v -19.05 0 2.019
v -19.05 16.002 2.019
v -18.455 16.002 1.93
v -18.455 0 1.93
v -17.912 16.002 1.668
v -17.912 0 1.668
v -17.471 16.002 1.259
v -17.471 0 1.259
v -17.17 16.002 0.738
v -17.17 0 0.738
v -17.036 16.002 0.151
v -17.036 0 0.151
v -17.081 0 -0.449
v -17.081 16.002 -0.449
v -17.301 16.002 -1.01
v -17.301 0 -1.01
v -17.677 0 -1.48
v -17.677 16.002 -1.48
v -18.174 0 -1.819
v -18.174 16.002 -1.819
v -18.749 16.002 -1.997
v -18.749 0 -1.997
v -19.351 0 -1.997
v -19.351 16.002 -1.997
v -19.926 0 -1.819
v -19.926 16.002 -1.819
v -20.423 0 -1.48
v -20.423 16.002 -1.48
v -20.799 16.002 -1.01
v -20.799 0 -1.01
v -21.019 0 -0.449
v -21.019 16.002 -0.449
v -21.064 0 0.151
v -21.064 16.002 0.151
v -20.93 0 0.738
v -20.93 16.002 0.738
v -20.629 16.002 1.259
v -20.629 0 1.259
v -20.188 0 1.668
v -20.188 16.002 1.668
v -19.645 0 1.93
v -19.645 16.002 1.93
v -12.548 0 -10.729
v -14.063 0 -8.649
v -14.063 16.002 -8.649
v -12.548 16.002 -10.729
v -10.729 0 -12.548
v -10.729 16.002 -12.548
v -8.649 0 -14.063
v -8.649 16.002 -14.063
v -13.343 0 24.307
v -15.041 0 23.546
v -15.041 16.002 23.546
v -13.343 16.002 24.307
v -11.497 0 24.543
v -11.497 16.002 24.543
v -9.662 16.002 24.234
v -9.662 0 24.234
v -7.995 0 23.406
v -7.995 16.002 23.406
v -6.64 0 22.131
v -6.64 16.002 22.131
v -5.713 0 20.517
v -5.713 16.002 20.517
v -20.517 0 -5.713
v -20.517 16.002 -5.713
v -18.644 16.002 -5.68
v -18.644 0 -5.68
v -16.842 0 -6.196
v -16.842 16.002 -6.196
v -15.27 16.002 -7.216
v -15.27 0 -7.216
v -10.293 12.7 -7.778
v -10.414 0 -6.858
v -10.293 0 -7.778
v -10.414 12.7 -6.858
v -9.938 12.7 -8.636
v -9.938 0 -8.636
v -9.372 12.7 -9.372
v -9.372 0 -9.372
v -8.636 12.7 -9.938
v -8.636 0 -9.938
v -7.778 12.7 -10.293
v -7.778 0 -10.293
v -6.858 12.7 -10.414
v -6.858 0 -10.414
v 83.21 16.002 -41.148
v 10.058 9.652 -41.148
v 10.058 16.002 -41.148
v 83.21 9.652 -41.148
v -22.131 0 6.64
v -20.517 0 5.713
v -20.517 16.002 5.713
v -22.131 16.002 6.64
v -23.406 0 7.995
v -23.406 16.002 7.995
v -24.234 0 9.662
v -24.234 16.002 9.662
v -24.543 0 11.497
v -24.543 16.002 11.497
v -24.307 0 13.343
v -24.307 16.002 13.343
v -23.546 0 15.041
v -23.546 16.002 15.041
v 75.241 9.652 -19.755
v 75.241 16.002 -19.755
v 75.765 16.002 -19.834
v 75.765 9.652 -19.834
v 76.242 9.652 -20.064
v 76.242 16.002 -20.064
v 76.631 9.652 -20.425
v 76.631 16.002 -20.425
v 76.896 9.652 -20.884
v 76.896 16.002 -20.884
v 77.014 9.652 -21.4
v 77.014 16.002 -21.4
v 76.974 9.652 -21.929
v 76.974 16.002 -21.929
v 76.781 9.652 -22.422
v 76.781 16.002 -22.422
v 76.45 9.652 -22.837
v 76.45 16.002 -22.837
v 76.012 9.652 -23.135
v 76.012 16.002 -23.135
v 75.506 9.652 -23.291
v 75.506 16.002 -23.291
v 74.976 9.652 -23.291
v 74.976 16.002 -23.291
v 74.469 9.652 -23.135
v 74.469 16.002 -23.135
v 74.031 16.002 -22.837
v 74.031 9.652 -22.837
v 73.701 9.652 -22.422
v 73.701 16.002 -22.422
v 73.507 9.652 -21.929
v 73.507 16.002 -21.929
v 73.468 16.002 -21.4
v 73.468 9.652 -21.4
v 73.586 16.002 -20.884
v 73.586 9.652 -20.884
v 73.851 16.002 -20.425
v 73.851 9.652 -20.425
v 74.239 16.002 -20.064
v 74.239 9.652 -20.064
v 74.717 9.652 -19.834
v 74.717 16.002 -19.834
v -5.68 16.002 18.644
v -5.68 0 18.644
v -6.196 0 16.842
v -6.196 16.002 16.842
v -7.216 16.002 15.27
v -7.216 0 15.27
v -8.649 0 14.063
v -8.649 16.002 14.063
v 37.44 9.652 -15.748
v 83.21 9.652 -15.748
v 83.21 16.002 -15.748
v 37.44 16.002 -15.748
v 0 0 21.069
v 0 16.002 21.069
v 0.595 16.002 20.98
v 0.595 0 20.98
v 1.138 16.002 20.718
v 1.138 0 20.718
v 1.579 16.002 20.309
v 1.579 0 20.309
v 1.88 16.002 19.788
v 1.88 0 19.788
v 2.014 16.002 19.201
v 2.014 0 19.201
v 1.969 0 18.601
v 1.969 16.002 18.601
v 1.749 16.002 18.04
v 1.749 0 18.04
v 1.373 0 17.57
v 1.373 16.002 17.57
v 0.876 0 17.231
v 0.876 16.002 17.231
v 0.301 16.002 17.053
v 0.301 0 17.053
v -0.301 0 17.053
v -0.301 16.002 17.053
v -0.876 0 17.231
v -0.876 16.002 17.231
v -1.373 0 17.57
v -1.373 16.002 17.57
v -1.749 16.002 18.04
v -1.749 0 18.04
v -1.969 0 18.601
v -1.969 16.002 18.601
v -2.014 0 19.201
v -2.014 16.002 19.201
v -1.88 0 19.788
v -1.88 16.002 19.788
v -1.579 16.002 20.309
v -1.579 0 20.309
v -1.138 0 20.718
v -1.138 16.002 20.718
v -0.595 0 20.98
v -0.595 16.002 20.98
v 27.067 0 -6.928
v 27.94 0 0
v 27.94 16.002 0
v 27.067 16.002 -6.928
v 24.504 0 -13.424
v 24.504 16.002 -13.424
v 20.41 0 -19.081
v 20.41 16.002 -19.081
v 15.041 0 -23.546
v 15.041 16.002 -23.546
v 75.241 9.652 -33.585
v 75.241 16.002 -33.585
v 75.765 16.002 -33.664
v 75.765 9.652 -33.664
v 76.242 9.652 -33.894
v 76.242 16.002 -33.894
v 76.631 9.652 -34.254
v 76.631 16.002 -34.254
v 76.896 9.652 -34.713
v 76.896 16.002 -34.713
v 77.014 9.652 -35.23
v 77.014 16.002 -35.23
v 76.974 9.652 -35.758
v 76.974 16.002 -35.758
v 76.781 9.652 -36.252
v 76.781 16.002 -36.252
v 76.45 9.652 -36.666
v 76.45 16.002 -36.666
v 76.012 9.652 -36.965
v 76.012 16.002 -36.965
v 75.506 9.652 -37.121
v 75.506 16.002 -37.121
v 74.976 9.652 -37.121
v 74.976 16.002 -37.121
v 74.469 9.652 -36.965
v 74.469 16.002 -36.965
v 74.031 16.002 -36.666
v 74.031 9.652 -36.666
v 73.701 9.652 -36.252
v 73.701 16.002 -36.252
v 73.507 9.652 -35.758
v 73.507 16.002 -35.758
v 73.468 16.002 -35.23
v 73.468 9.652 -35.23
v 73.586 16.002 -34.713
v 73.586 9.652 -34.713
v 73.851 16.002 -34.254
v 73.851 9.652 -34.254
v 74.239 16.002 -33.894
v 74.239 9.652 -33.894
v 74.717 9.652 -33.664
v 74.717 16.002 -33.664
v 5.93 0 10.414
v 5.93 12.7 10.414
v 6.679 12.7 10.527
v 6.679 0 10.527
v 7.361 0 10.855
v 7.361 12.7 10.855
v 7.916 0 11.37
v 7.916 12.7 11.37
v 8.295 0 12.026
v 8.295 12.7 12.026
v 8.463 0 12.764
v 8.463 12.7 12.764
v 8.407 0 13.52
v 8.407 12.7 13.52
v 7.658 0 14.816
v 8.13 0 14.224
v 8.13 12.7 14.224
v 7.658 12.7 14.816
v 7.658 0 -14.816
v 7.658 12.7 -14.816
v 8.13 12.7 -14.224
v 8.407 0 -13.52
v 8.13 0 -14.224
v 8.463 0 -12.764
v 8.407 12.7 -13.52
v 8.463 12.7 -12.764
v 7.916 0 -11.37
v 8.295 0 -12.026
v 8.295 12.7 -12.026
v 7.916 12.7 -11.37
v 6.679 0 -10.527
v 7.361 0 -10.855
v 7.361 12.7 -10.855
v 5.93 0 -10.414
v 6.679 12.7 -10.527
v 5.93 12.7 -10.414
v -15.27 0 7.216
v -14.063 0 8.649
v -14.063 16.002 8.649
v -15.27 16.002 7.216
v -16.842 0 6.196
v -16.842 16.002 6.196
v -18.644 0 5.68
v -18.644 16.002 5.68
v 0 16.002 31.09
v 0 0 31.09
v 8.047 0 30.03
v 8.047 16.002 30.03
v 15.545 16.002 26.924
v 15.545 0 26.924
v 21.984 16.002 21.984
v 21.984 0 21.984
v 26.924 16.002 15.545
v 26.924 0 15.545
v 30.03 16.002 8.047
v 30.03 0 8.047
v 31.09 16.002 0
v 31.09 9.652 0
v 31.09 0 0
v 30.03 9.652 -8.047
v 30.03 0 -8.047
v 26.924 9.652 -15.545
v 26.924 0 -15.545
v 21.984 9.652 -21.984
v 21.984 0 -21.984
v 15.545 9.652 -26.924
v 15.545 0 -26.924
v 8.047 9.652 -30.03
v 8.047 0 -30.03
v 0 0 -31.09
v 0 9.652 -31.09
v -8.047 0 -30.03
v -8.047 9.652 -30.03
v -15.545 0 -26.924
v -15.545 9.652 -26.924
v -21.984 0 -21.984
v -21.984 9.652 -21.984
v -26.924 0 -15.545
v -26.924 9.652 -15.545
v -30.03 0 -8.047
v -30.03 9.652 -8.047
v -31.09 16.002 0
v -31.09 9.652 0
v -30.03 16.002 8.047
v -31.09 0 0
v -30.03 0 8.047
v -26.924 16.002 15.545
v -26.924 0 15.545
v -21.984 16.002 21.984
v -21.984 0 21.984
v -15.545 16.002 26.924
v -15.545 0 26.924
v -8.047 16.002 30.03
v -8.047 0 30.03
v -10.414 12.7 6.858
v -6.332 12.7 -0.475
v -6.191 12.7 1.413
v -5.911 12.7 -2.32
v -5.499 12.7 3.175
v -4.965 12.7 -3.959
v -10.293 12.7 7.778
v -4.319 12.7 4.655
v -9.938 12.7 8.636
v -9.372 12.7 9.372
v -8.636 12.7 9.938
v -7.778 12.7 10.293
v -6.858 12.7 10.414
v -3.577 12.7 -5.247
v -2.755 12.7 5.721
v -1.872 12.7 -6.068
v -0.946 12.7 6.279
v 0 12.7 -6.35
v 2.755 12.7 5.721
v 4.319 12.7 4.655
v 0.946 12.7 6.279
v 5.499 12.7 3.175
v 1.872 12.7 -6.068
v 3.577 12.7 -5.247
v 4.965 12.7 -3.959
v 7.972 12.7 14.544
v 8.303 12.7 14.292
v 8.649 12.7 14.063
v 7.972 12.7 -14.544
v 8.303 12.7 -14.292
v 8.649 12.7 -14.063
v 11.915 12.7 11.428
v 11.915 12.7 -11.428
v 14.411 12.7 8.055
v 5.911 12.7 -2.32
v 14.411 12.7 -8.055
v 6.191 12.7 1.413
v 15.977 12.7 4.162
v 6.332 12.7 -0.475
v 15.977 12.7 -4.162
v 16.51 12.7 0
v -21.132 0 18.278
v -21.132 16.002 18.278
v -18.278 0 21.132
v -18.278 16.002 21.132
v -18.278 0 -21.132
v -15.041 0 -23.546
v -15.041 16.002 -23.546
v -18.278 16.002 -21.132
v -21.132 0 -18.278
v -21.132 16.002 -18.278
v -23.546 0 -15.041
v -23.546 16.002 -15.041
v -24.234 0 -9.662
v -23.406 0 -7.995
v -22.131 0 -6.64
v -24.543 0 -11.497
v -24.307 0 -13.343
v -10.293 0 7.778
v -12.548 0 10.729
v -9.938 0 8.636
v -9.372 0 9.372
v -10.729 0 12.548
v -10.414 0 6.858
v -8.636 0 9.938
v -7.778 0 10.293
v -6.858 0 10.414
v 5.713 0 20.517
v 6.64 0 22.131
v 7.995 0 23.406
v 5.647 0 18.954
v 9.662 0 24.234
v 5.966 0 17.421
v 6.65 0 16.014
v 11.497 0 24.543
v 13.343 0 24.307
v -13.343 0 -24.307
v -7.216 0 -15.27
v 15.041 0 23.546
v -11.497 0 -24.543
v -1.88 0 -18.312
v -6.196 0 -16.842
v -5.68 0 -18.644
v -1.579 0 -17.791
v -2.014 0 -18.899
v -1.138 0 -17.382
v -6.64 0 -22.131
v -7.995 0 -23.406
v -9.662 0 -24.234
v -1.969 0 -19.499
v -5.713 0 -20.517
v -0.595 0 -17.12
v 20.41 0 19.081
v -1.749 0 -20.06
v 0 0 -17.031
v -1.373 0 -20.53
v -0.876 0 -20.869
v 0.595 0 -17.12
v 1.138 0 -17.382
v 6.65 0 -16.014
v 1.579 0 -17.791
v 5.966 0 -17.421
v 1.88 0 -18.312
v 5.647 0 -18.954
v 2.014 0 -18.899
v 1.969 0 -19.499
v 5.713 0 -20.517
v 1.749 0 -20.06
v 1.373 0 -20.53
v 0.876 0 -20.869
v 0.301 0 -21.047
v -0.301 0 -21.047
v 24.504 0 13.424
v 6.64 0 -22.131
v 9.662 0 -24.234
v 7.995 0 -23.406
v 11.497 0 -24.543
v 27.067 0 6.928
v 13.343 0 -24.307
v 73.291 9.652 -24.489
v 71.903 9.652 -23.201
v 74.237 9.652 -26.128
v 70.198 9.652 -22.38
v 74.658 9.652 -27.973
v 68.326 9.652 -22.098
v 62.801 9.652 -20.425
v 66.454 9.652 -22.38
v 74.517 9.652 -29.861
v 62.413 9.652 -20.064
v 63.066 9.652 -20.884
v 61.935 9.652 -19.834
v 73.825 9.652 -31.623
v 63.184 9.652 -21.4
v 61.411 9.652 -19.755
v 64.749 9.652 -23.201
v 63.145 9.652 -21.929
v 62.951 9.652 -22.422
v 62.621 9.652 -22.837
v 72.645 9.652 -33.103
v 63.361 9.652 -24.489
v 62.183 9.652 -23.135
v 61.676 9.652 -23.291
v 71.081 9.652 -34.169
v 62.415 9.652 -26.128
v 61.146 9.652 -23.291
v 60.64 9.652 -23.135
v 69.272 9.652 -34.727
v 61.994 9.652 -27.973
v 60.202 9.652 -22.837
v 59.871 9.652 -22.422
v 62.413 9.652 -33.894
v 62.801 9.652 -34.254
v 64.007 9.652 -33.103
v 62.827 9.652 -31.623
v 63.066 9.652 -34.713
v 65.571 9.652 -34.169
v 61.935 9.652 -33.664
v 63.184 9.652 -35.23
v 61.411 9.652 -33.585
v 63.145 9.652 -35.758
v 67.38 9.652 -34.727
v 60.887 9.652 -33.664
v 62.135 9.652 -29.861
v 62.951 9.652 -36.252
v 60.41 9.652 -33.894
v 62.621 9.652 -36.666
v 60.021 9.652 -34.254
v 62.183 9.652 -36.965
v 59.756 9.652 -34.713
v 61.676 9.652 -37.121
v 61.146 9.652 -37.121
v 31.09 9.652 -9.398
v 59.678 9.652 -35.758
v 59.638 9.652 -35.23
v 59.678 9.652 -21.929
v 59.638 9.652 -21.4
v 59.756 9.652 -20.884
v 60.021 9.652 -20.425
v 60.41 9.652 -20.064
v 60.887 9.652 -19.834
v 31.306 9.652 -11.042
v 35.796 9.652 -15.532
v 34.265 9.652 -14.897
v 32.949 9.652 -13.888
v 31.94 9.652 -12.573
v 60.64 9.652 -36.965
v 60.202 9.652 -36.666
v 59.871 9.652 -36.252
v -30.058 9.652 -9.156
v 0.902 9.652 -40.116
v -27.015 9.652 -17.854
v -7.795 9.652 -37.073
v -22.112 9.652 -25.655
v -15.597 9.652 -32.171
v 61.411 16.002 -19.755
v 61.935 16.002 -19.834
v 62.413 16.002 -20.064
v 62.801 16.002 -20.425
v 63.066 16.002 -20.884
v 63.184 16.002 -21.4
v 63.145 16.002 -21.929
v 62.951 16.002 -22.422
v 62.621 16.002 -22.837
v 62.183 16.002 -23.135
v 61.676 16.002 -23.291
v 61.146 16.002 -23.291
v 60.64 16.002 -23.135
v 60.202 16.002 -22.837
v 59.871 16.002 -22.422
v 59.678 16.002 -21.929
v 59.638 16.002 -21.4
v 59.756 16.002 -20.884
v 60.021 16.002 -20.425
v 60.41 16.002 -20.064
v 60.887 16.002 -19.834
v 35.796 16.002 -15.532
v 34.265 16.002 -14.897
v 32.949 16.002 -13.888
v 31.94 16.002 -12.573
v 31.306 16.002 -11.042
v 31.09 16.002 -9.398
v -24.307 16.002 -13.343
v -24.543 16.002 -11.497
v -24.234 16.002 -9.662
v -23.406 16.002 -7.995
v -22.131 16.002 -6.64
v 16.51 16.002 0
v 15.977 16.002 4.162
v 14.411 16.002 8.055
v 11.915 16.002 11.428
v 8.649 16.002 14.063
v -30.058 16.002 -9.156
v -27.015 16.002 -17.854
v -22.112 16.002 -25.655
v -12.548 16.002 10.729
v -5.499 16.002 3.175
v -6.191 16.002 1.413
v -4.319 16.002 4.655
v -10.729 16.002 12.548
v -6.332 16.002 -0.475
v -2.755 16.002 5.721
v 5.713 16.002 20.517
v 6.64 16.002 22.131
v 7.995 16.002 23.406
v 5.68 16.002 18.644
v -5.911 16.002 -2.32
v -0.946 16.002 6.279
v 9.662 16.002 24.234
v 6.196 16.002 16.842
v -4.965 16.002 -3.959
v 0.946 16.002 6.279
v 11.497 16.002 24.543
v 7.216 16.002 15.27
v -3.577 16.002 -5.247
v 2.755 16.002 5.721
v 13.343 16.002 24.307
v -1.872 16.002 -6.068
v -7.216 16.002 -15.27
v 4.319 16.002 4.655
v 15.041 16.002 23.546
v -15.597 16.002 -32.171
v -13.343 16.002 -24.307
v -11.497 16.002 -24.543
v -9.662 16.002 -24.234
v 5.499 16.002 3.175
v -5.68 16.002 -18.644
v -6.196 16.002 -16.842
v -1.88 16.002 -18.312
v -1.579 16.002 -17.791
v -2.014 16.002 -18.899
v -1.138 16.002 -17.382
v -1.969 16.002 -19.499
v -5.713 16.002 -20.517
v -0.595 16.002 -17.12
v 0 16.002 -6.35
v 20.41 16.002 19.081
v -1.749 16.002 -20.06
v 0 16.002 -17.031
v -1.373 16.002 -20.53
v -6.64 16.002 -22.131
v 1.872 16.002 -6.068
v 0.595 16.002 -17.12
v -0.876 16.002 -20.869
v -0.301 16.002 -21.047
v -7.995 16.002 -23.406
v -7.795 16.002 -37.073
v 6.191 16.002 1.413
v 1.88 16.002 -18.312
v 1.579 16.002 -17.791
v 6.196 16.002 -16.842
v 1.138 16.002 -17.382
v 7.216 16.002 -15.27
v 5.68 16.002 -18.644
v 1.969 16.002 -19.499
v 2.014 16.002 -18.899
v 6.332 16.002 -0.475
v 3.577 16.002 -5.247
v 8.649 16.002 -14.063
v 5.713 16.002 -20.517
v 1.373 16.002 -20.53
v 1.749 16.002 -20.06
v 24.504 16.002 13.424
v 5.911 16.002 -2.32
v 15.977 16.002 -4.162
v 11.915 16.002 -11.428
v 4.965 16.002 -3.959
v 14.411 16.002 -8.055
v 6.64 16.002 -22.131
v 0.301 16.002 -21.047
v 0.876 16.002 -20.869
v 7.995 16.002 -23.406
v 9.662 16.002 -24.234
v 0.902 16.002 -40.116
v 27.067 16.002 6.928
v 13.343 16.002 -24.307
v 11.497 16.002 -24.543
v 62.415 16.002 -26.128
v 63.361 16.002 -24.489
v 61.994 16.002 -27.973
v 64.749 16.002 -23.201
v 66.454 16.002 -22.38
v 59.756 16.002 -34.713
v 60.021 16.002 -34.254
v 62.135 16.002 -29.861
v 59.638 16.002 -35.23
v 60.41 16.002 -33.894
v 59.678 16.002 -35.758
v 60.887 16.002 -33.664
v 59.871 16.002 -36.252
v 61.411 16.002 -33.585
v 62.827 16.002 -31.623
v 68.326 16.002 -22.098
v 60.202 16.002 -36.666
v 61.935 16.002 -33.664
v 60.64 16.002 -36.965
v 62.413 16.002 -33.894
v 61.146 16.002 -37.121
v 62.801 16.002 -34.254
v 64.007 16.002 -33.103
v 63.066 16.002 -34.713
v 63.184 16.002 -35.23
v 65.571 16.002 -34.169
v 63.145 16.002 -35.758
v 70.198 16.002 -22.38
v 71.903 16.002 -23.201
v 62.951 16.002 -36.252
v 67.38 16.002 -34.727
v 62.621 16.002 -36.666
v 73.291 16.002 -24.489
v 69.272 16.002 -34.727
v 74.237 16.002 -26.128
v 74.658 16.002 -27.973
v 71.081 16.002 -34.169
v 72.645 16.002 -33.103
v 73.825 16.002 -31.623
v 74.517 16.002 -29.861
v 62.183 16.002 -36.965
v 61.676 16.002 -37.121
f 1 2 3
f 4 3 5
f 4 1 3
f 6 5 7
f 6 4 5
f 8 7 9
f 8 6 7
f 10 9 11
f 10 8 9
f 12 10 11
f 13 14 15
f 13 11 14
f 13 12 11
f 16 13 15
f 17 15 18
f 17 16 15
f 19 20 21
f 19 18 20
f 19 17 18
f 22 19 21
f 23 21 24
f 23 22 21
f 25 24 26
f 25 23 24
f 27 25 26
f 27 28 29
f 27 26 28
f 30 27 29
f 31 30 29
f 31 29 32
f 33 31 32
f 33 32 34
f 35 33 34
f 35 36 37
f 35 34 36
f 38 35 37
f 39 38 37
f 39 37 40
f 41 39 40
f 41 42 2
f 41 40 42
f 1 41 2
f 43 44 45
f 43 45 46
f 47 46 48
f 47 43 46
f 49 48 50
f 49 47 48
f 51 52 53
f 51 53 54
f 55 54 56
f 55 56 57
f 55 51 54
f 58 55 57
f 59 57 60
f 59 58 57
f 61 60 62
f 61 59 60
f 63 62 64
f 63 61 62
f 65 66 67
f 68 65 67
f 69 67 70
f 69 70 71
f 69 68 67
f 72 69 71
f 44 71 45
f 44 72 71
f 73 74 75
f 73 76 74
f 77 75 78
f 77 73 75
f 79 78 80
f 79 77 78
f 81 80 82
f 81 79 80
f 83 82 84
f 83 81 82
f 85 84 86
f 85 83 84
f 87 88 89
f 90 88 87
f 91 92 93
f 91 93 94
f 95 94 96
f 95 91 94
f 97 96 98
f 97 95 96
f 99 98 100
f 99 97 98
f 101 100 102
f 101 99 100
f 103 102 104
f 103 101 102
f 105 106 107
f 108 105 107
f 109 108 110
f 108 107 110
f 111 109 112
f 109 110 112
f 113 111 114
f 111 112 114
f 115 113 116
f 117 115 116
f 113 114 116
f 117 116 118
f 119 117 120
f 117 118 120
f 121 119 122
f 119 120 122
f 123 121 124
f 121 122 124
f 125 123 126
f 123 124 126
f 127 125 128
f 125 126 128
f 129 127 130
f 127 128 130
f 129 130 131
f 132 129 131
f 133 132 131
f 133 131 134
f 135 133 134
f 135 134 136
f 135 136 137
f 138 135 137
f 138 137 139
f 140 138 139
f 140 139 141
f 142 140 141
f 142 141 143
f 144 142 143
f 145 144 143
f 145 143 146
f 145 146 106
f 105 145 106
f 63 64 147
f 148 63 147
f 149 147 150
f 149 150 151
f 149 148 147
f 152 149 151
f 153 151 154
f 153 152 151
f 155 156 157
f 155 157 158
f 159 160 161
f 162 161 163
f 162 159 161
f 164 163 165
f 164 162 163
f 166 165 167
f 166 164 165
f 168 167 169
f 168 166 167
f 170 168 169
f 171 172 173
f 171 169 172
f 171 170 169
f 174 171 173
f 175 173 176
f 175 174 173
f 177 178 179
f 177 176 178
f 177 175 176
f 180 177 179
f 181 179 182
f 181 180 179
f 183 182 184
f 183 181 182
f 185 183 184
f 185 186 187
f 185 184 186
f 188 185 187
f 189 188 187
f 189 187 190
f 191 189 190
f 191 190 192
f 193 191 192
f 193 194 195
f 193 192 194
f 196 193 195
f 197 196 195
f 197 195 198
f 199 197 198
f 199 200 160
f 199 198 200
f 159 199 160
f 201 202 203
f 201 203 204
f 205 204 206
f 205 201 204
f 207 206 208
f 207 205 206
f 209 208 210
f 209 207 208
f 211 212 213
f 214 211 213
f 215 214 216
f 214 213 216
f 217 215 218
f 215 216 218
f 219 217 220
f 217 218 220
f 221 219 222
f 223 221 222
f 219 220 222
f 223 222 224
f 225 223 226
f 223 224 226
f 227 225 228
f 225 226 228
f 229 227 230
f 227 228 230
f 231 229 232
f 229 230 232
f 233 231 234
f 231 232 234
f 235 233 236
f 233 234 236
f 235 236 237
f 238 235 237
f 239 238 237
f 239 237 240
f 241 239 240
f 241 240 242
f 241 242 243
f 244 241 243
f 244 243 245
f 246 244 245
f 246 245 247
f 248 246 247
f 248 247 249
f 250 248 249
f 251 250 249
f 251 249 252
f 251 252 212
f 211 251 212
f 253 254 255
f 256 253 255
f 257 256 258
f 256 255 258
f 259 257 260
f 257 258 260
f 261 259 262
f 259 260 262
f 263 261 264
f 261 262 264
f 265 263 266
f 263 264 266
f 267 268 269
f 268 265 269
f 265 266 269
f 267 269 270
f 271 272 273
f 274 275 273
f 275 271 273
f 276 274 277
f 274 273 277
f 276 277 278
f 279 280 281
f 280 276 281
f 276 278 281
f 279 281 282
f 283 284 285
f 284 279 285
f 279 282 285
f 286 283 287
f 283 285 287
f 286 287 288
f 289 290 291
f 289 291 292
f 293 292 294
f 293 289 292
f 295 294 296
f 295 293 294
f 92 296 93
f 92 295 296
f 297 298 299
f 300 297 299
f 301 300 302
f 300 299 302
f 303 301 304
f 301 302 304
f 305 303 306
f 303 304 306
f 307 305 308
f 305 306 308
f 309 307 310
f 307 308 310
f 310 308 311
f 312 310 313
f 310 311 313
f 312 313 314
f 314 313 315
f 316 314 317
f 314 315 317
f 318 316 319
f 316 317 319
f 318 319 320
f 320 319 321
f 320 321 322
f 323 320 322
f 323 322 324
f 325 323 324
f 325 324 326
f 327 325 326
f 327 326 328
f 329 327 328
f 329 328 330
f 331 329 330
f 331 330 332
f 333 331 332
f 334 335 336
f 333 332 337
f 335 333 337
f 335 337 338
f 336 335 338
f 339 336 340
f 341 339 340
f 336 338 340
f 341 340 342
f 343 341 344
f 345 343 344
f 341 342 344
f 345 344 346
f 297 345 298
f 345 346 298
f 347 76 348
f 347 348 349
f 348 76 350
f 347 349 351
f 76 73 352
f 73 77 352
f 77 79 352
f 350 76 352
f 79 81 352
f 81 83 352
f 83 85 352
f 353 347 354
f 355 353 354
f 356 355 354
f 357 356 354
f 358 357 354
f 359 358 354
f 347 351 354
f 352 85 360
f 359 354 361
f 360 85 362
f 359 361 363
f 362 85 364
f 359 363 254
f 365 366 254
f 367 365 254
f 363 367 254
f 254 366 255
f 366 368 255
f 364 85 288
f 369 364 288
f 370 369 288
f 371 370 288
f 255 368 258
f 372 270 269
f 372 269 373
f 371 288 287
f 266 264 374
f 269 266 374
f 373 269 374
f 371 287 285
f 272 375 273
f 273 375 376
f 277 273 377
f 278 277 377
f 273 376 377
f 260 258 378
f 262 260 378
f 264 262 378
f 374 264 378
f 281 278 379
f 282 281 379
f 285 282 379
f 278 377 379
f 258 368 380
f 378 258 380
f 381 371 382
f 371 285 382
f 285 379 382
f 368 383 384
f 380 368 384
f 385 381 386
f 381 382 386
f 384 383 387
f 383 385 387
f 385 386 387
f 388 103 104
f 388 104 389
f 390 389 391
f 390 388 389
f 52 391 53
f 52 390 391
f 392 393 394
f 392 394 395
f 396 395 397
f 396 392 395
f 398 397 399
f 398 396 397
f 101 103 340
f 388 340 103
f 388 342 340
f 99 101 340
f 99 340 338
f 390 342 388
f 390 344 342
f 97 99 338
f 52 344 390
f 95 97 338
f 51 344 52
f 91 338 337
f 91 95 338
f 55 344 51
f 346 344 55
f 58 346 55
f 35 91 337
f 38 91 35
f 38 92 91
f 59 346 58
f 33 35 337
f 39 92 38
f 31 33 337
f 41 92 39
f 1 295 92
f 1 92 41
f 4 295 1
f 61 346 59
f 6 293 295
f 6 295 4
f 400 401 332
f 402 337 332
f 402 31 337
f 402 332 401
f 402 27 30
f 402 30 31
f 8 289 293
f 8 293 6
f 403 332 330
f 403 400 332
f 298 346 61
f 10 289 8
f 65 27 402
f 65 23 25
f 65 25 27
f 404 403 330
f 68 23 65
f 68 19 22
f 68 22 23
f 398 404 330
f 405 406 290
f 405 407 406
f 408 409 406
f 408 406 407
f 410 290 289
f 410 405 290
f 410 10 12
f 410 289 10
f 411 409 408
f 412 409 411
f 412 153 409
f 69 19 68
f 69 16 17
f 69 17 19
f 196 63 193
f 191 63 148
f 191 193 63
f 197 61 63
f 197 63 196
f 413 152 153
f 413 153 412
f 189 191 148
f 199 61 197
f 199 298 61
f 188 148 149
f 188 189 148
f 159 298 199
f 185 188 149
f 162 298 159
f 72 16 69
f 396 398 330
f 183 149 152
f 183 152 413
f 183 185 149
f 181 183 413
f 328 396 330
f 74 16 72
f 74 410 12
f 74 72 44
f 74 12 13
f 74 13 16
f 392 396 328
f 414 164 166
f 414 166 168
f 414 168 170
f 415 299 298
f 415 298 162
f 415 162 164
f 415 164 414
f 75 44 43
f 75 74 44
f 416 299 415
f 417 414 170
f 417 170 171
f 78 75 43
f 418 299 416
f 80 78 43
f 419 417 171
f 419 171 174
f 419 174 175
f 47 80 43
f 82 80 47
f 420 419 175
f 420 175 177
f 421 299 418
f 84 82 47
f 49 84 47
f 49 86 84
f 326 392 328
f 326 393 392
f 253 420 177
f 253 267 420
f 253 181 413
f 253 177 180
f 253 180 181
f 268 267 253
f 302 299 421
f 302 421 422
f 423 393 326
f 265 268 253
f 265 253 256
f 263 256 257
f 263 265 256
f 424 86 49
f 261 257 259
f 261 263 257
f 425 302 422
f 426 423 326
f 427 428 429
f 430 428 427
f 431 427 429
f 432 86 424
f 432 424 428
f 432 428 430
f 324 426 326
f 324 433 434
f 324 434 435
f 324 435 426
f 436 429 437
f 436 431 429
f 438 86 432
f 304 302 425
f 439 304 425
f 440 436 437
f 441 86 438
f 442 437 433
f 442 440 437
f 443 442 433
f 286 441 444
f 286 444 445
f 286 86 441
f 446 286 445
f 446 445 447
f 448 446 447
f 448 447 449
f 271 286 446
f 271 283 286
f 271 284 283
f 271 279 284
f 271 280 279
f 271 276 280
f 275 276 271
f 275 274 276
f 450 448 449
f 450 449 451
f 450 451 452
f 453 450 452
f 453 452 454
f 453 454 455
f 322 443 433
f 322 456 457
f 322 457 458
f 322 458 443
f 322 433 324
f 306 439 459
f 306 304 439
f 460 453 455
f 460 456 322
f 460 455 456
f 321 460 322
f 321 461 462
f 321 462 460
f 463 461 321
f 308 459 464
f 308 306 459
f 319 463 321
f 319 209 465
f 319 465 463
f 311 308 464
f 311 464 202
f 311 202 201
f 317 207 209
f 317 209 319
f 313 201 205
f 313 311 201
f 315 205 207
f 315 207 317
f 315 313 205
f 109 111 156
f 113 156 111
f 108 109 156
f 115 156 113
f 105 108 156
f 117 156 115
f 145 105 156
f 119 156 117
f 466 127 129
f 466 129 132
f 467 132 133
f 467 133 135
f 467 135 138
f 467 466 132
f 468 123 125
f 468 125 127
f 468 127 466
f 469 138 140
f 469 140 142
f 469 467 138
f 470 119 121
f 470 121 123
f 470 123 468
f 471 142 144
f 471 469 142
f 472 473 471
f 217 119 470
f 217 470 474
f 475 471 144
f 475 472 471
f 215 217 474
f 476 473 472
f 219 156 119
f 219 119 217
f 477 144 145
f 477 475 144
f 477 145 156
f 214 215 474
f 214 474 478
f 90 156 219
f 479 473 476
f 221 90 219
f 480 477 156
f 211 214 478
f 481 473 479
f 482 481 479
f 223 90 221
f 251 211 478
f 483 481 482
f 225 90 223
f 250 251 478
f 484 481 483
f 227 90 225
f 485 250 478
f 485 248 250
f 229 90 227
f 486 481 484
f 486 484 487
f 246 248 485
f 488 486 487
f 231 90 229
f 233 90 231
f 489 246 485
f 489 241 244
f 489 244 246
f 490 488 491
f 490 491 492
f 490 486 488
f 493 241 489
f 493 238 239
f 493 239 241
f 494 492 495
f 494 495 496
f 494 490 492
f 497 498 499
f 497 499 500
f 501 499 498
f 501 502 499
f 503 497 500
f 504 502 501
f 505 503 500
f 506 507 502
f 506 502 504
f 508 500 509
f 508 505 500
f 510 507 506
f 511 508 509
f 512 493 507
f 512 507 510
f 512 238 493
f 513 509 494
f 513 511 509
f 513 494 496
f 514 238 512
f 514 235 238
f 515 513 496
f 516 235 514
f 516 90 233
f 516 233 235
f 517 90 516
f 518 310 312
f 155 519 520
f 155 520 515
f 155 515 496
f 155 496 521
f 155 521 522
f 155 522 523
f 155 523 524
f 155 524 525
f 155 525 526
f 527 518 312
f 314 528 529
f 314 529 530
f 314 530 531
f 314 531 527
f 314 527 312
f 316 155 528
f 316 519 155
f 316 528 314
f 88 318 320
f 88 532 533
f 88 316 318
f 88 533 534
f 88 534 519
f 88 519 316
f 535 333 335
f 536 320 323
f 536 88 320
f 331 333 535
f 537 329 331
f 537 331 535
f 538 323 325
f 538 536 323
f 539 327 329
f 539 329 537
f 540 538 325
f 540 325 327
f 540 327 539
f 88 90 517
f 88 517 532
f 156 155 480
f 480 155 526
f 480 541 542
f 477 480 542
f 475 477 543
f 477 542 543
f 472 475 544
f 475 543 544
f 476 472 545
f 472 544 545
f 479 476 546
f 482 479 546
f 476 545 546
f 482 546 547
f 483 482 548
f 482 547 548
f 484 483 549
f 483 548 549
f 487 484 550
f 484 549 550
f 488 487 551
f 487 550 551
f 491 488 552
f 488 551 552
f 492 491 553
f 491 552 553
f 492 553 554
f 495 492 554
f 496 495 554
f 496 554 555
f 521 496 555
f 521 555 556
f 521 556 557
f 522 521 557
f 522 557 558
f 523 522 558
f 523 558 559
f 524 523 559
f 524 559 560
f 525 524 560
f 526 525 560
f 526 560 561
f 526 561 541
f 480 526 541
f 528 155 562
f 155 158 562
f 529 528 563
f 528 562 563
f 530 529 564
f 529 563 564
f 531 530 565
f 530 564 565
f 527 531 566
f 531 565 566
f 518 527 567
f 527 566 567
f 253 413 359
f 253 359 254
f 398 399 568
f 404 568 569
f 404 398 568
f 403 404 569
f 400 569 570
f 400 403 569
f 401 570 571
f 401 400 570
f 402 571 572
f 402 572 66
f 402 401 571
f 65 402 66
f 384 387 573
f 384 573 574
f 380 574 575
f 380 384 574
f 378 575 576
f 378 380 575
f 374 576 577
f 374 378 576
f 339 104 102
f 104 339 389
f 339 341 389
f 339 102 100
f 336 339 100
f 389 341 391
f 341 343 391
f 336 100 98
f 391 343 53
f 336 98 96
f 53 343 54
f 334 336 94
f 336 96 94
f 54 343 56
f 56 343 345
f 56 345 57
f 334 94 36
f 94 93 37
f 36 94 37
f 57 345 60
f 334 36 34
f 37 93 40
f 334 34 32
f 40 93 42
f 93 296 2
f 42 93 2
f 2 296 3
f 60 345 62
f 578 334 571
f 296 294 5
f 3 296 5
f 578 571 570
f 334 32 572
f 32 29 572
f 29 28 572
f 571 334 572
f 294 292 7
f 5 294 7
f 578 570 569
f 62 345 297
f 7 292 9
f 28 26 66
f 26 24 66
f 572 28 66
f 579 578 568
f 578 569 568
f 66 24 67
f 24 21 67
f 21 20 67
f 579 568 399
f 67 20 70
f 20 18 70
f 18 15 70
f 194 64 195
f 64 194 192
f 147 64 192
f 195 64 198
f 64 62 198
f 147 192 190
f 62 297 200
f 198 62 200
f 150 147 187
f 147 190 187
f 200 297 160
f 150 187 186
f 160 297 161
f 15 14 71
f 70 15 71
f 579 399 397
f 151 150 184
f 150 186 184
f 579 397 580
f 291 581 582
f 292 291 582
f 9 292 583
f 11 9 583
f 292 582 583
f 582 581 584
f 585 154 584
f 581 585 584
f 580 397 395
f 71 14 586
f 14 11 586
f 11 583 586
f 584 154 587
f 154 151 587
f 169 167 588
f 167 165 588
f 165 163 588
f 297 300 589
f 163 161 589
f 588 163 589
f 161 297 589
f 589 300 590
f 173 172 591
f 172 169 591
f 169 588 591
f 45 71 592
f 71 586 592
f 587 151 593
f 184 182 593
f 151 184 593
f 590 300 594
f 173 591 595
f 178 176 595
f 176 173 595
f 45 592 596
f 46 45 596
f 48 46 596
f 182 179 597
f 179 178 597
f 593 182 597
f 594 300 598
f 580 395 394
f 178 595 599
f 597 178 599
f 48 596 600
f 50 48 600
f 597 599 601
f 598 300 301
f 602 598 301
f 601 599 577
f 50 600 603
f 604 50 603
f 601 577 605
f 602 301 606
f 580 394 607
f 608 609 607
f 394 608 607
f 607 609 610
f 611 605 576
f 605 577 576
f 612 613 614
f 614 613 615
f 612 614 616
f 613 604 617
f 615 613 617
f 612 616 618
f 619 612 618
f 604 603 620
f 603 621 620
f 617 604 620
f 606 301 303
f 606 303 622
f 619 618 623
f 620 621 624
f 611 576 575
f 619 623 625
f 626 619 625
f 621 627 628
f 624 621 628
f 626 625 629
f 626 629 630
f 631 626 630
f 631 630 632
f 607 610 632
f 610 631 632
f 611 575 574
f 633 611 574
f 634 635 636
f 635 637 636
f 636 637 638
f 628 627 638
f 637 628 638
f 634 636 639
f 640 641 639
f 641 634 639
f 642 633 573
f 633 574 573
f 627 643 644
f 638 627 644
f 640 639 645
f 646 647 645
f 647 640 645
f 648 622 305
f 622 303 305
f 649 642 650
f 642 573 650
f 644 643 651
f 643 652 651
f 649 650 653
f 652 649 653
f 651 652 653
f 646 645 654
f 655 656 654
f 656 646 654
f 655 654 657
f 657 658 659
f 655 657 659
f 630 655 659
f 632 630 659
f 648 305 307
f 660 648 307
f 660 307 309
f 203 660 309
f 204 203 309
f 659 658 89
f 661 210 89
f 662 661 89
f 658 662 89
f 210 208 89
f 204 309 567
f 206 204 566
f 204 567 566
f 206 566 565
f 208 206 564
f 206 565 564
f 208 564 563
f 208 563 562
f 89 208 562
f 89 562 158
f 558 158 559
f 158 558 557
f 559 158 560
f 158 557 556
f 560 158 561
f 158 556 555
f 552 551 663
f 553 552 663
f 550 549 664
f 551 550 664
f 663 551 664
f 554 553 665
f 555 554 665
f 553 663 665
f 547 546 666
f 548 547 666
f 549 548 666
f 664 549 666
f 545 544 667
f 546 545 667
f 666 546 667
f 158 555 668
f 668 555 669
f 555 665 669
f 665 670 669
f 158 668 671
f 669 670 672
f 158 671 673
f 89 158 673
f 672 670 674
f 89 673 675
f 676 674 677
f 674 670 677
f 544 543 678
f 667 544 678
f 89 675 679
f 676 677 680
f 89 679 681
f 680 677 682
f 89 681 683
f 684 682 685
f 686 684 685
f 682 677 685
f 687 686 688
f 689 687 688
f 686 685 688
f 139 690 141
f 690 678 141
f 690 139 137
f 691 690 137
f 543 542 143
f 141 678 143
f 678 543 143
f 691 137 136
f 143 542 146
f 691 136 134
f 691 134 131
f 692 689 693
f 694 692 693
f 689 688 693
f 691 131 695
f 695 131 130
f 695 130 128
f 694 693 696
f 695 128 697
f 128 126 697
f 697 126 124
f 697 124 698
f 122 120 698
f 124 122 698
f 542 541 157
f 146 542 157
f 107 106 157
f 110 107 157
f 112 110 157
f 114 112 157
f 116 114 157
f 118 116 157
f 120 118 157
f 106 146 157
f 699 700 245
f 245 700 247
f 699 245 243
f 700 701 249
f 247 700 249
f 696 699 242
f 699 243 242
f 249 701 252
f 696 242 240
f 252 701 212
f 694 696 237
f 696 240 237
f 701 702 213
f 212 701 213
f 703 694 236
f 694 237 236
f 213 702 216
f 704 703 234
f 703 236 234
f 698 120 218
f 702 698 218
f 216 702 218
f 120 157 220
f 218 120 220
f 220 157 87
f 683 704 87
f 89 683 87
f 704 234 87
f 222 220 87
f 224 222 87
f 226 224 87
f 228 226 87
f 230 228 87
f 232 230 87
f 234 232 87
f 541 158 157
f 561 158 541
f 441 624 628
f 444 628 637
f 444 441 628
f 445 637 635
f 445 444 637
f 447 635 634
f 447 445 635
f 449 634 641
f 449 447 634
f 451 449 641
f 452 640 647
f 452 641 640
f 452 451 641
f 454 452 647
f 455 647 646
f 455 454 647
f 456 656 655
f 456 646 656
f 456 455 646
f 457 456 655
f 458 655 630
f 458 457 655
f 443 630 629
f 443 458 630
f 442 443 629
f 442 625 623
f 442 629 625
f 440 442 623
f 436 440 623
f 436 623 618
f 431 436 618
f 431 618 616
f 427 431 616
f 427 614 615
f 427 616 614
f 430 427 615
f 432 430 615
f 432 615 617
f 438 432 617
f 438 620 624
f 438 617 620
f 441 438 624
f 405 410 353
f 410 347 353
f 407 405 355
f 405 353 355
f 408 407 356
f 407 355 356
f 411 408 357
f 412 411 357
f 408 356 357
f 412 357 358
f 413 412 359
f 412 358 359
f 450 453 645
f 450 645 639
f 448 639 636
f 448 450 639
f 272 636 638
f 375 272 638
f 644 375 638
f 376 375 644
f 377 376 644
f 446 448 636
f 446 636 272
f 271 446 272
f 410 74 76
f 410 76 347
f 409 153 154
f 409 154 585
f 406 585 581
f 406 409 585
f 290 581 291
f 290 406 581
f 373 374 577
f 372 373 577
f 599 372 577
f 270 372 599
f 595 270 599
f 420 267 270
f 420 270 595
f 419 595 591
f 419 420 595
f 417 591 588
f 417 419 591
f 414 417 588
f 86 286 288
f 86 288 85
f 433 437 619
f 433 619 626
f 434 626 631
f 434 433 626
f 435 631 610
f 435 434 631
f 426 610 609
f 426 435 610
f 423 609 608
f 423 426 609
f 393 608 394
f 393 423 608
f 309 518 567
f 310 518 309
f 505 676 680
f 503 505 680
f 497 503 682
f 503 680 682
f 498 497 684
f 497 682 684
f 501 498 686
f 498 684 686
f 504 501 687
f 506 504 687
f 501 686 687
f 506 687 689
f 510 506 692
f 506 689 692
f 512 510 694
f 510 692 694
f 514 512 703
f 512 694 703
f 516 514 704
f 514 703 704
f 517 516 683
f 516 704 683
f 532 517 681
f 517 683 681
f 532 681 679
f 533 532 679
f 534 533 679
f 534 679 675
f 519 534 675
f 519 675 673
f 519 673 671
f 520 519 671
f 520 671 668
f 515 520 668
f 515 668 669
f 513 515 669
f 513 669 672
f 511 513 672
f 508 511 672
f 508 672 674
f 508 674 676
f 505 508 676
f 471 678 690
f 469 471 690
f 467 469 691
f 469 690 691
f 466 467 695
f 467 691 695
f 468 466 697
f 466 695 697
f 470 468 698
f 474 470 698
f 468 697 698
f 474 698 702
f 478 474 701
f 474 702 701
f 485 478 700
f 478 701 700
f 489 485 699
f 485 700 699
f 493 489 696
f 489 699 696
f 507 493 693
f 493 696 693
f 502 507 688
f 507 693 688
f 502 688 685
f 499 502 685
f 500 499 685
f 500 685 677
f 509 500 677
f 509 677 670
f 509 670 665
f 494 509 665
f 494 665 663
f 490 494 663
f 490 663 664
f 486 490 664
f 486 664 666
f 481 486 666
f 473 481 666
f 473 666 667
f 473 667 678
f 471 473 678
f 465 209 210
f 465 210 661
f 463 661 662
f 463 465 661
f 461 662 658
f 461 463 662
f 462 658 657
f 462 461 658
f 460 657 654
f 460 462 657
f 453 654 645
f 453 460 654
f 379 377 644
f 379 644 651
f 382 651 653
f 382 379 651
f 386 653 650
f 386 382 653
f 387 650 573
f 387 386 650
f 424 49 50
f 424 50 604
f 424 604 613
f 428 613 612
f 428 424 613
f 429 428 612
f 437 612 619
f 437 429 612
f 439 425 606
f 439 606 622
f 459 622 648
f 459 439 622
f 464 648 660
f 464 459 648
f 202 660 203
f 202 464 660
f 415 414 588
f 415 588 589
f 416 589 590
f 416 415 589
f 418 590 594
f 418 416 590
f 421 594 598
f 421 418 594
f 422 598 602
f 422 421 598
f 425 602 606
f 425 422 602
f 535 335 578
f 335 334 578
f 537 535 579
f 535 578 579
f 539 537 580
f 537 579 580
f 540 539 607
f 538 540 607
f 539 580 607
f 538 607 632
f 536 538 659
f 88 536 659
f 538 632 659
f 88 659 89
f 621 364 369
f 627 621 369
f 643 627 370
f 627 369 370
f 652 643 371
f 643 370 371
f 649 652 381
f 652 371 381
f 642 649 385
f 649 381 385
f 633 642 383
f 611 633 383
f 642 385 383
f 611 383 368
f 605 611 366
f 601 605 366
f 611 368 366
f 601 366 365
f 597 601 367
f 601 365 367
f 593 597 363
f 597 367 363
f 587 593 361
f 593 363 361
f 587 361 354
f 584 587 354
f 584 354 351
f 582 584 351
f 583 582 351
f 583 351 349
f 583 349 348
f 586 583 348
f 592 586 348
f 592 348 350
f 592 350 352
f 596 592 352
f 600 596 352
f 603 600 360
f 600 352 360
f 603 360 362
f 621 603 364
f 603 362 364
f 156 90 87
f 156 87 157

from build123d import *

# Parameters (mm, degrees)
SKETCH1_R           = 31.0896
BOSS_EXTRUDE1_DEPTH = 16.002
BOSS_EXTRUDE2_START = -6.35
BOSS_EXTRUDE2_DEPTH = 6.35
FILLET2_R           = 6.35
CUT_EXTRUDE2_REACH  = 96.198
SKETCH4_R           = 1.778
SKETCH4_R_2         = 6.35
SKETCH7_R           = 2.0193
CUT_EXTRUDE4_DEPTH  = 95.197625109
FILLET7_R           = 6.35
FILLET8_R           = 41.148
CUT_EXTRUDE5_DEPTH  = 12.7
FILLET9_R           = 2.54
SKETCH9_R           = 6.35
CUT_EXTRUDE6_DEPTH  = 3.302
FILLET10_R          = 3.556


# Some blends are built 0.0001 mm under size
with BuildPart() as part:
    # Sketch1 → Boss-Extrude1 (new body)
    with BuildSketch(Plane(origin=(0, 0, 0), x_dir=(1, 0, 0), z_dir=(0, 1, 0))):
        with Locations(Location((0, 0, 0), (0, 0, 270))):
            Circle(SKETCH1_R)
    extrude(amount=BOSS_EXTRUDE1_DEPTH)

    # Sketch2 → Boss-Extrude2 (add)
    with BuildSketch(Plane(origin=(0, 16.002, 0), x_dir=(1, 0, 0), z_dir=(0, 1, 0)).offset(BOSS_EXTRUDE2_START)):
        with BuildLine():
            Line((-31.0896, 0), (-31.0896, 41.148))
            Line((-31.0896, 41.148), (83.2104, 41.148))
            Line((83.2104, 41.148), (83.2104, 15.748))
            Line((83.2104, 15.748), (31.0896, 15.748))
            Line((31.0896, 15.748), (31.0896, 0))
            ThreePointArc((31.0896, 0), (0, -31.0896), (-31.0896, 0))
        make_face()
    extrude(amount=BOSS_EXTRUDE2_DEPTH)

    # Fillet2
    fillet2_edges = [part.edges().sort_by_distance(p)[0] for p in [
        (31.0896, 12.827, -15.748),
    ]]
    fillet(fillet2_edges, radius=FILLET2_R)

    # Sketch4 → Cut-Extrude2 (cut, up to next)
    with BuildSketch(Plane(origin=(0, 16.002, 0), x_dir=(1, 0, 0), z_dir=(0, 1, 0)), mode=Mode.PRIVATE) as cut_extrude2_sk1:
        with Locations(Location((61.411202787, 35.362797213, 0), (0, 0, 270))):
            Circle(SKETCH4_R)
    cut_extrude2_tool1 = extrude(cut_extrude2_sk1.sketch, amount=-CUT_EXTRUDE2_REACH, mode=Mode.PRIVATE) & part.part
    # Sketch4 → Cut-Extrude2 (cut, up to next)
    with BuildSketch(Plane(origin=(0, 16.002, 0), x_dir=(1, 0, 0), z_dir=(0, 1, 0)), mode=Mode.PRIVATE) as cut_extrude2_sk2:
        with Locations(Location((75.240797213, 35.362797213, 0), (0, 0, 270))):
            Circle(SKETCH4_R)
    cut_extrude2_tool2 = extrude(cut_extrude2_sk2.sketch, amount=-CUT_EXTRUDE2_REACH, mode=Mode.PRIVATE) & part.part
    # Sketch4 → Cut-Extrude2 (cut, up to next)
    with BuildSketch(Plane(origin=(0, 16.002, 0), x_dir=(1, 0, 0), z_dir=(0, 1, 0)), mode=Mode.PRIVATE) as cut_extrude2_sk3:
        with Locations(Location((75.240797213, 21.533202787, 0), (0, 0, 270))):
            Circle(SKETCH4_R)
    cut_extrude2_tool3 = extrude(cut_extrude2_sk3.sketch, amount=-CUT_EXTRUDE2_REACH, mode=Mode.PRIVATE) & part.part
    # Sketch4 → Cut-Extrude2 (cut, up to next)
    with BuildSketch(Plane(origin=(0, 16.002, 0), x_dir=(1, 0, 0), z_dir=(0, 1, 0)), mode=Mode.PRIVATE) as cut_extrude2_sk4:
        with Locations(Location((68.326, 28.448, 0), (0, 0, 270))):
            Circle(SKETCH4_R_2)
    cut_extrude2_tool4 = extrude(cut_extrude2_sk4.sketch, amount=-CUT_EXTRUDE2_REACH, mode=Mode.PRIVATE) & part.part
    # Sketch4 → Cut-Extrude2 (cut, up to next)
    with BuildSketch(Plane(origin=(0, 16.002, 0), x_dir=(1, 0, 0), z_dir=(0, 1, 0)), mode=Mode.PRIVATE) as cut_extrude2_sk5:
        with Locations(Location((61.411202787, 21.533202787, 0), (0, 0, 270))):
            Circle(SKETCH4_R)
    cut_extrude2_tool5 = extrude(cut_extrude2_sk5.sketch, amount=-CUT_EXTRUDE2_REACH, mode=Mode.PRIVATE) & part.part
    add(cut_extrude2_tool1.solids().sort_by_distance((61.411203, 16.002, -35.362797))[0], mode=Mode.SUBTRACT)
    add(cut_extrude2_tool2.solids().sort_by_distance((75.240797, 16.002, -35.362797))[0], mode=Mode.SUBTRACT)
    add(cut_extrude2_tool3.solids().sort_by_distance((75.240797, 16.002, -21.533203))[0], mode=Mode.SUBTRACT)
    add(cut_extrude2_tool4.solids().sort_by_distance((68.326, 16.002, -28.448))[0], mode=Mode.SUBTRACT)
    add(cut_extrude2_tool5.solids().sort_by_distance((61.411203, 16.002, -21.533203))[0], mode=Mode.SUBTRACT)

    # Sketch7 → Cut-Extrude4 (cut, through all)
    with BuildSketch(Plane(origin=(0, 0, 0), x_dir=(1, 0, 0), z_dir=(0, 1, 0))):
        with BuildLine():
            ThreePointArc((27.94, 0), (22.235278576, 16.918510179), (7.450666667, 26.928259621))
            Line((7.450666667, 26.928259621), (4.402666667, 15.912153412))
            ThreePointArc((4.402666667, 15.912153412), (13.139028249, 9.997301469), (16.51, 0))
            ThreePointArc((16.51, 0), (13.139028249, -9.997301469), (4.402666667, -15.912153412))
            Line((4.402666667, -15.912153412), (7.450666667, -26.928259621))
            ThreePointArc((7.450666667, -26.928259621), (22.235278576, -16.918510179), (27.94, 0))
        make_face()
        with BuildLine():
            Line((-15.912153412, -4.402666667), (-26.928259621, -7.450666667))
            ThreePointArc((-26.928259621, -7.450666667), (-19.756563466, -19.756563466), (-7.450666667, -26.928259621))
            Line((-7.450666667, -26.928259621), (-4.402666667, -15.912153412))
            ThreePointArc((-4.402666667, -15.912153412), (-11.674332957, -11.674332957), (-15.912153412, -4.402666667))
        make_face()
        with BuildLine():
            Line((-4.402666667, 15.912153412), (-7.450666667, 26.928259621))
            ThreePointArc((-7.450666667, 26.928259621), (-19.756563466, 19.756563466), (-26.928259621, 7.450666667))
            Line((-26.928259621, 7.450666667), (-15.912153412, 4.402666667))
            ThreePointArc((-15.912153412, 4.402666667), (-11.674332957, 11.674332957), (-4.402666667, 15.912153412))
        make_face()
        with Locations(Location((-19.05, 0, 0), (0, 0, 270))):
            Circle(SKETCH7_R)
        with Locations(Location((0, -19.05, 0), (0, 0, 270))):
            Circle(SKETCH7_R)
        with Locations(Location((0, 19.05, 0), (0, 0, 270))):
            Circle(SKETCH7_R)
    extrude(amount=CUT_EXTRUDE4_DEPTH, mode=Mode.SUBTRACT)

    # Fillet7
    # the kernel refuses this fillet: 6.35 mm, written as the material it adds along each edge
    with BuildSketch(Plane(origin=(-26.928259621, 0, -7.450666667), x_dir=(0.40702884348062, 0, -0.9134153056385845), z_dir=(0, 1, 0)), Plane(origin=(-7.450666667, 0, 26.928259621), x_dir=(-0.9134153056385848, 0, -0.40702884348061963), z_dir=(0, 1, 0))) as fillet7_piece_1:
        with BuildLine():
            CenterArc((7.365726845, -6.279391075), FILLET7_R, 81.447682412, 107.104635177)
            Line((1.086335771, -7.223715029), (0, 0))
            ThreePointArc((0, 0), (4.1550254, 0.310679271), (8.3100508, 0))
        make_face()
    extrude(amount=16.002)
    with BuildSketch(Plane(origin=(-7.450666667, 0, -26.928259621), x_dir=(0.26666666666666705, 0, 0.9637888196533972), z_dir=(0, 1, 0)), Plane(origin=(7.450666667, 0, 26.928259621), x_dir=(-0.26666666666666733, 0, -0.9637888196533971), z_dir=(0, 1, 0)), Plane(origin=(-26.928259621, 0, 7.450666667), x_dir=(0.9637888196533975, 0, -0.26666666666666644), z_dir=(0, 1, 0))) as fillet7_piece_2:
        with BuildLine():
            CenterArc((7.304942452, -6.35), FILLET7_R, 90, 107.104635177)
            ThreePointArc((1.235807879, -8.217647059), (0.310679271, -4.1550254), (0, 0))
            Line((0, 0), (7.304942452, 0))
        make_face()
    extrude(amount=16.002)
    with BuildSketch(Plane(origin=(-4.402666667, 0, -15.912153412), x_dir=(-0.916852417954672, 0, 0.39922630636103035), z_dir=(0, 1, 0)), Plane(origin=(4.402666667, 0, 15.912153412), x_dir=(0.9168524179546733, 0, -0.39922630636102746), z_dir=(0, 1, 0)), Plane(origin=(-15.912153412, 0, 4.402666667), x_dir=(0.39922630636102946, 0, 0.9168524179546725), z_dir=(0, 1, 0))) as fillet7_piece_3:
        with BuildLine():
            CenterArc((5.522661099, -6.287214109), FILLET7_R, 98.063810107, 73.872379787)
            Line((-0.76455301, -5.396462319), (0, 0))
            ThreePointArc((0, 0), (2.315954654, -0.163243317), (4.631909309, 0))
        make_face()
    extrude(amount=16.002)
    with BuildSketch(Plane(origin=(4.402666667, 0, -15.912153412), x_dir=(0.26666666666666416, 0, -0.9637888196533979), z_dir=(0, 1, 0))) as fillet7_piece_4:
        with BuildLine():
            CenterArc((5.450352912, -6.35), FILLET7_R, 90, 73.872379787)
            ThreePointArc((-0.649745119, -4.586111111), (-0.163243317, -2.315954654), (0, 0))
            Line((0, 0), (5.450352912, 0))
        make_face()
    extrude(amount=16.002)
    with BuildSketch(Plane(origin=(7.450666667, 0, -26.928259621), x_dir=(-0.2666666666666666, 0, 0.9637888196533974), z_dir=(0, 1, 0))) as fillet7_piece_5:
        with BuildLine():
            CenterArc((7.304942452, 6.35), FILLET7_R, 162.895364823, 107.104635177)
            ThreePointArc((1.235807879, 8.217647059), (0.310679271, 4.1550254), (0, 0))
            Line((0, 0), (7.304942452, 0))
        make_face()
    extrude(amount=16.002)
    with BuildSketch(Plane(origin=(-4.402666667, 0, 15.912153412), x_dir=(-0.9168524179546729, 0, -0.3992263063610288), z_dir=(0, 1, 0)), Plane(origin=(-15.912153412, 0, -4.402666667), x_dir=(0.39922630636102996, 0, -0.9168524179546723), z_dir=(0, 1, 0))) as fillet7_piece_6:
        with BuildLine():
            CenterArc((5.522661099, 6.287214109), FILLET7_R, 188.063810107, 73.872379787)
            Line((-0.76455301, 5.396462319), (0, 0))
            ThreePointArc((0, 0), (2.315954654, 0.163243317), (4.631909309, 0))
        make_face()
    extrude(amount=16.002)

    # Fillet8
    fillet8_edges = [part.edges().sort_by_distance(p)[0] for p in [
        (-31.0896, 12.827, -41.148),
    ]]
    fillet(fillet8_edges, radius=FILLET8_R - 0.0001)  # a hair under: the kernel refuses the full size

    # Sketch8 → Cut-Extrude5 (cut)
    with BuildSketch(Plane.XZ):
        with BuildLine():
            Line((-10.414, 10.414), (10.414, 10.414))
            ThreePointArc((10.414, 10.414), (20.828, 0), (10.414, -10.414))
            Line((10.414, -10.414), (-10.414, -10.414))
            Line((-10.414, -10.414), (-10.414, 10.414))
        make_face()
    extrude(amount=-CUT_EXTRUDE5_DEPTH, mode=Mode.SUBTRACT)

    # Fillet9
    # the kernel refuses this fillet: 2.54 mm, written as the material it takes off along each edge
    with BuildSketch(Plane(origin=(13.087195122, 12.7, 10.065059555), x_dir=(-0.7525451578932851, 0, 0.658540648199768), z_dir=(0, -1, 0))) as fillet9_piece_1:
        with BuildLine():
            CenterArc((7.288242174, 2.538935053), FILLET9_R, 131.188669075, 137.152126286)
            Line((5.615548928, 4.450399754), (5.448279603, 4.641546224))
            ThreePointArc((5.448279603, 4.641546224), (2.074222188, 1.688960676), (-0.1125988, 0.227678524))
            Line((-0.1125988, 0.227678524), (-0.049545453, -0.249120951))
            ThreePointArc((-0.049545453, -0.249120951), (6.014734512, -0.336617786), (7.207343199, -0.253893505))
            Line((7.207343199, -0.253893505), (7.214697651, 0))
        make_face()
    extrude(amount=30.736744128, mode=Mode.SUBTRACT)
    with BuildSketch(Plane(origin=(13.087195122, 12.7, -10.065059555), x_dir=(-0.7525451578933744, 0, -0.658540648199666), z_dir=(0, -1, 0))) as fillet9_piece_2:
        with BuildLine():
            CenterArc((7.288242174, -2.538935053), FILLET9_R, 91.659204639, 137.152126286)
            Line((5.615548928, -4.450399754), (5.448279603, -4.641546224))
            ThreePointArc((5.448279603, -4.641546224), (2.074222188, -1.688960676), (-0.1125988, -0.227678524))
            Line((-0.1125988, -0.227678524), (-0.049545453, 0.249120951))
            ThreePointArc((-0.049545453, 0.249120951), (6.014734512, 0.336617786), (7.207343199, 0.253893505))
            Line((7.207343199, 0.253893505), (7.214697651, 0))
        make_face()
    extrude(amount=30.736744128, mode=Mode.SUBTRACT)

    # Sketch9 → Cut-Extrude6 (cut)
    with BuildSketch(Plane.XZ.offset(-12.7)):
        with Locations(Location((0, 0, 0), (0, 0, 270))):
            Circle(SKETCH9_R)
    extrude(amount=-CUT_EXTRUDE6_DEPTH, mode=Mode.SUBTRACT)

    # Fillet10
    fillet10_edges = [part.edges().sort_by_distance(p)[0] for p in [
        (-10.414, 6.35, -10.414),
        (-10.414, 6.35, 10.414),
    ]]
    fillet(fillet10_edges, radius=FILLET10_R)


solid = part.part
